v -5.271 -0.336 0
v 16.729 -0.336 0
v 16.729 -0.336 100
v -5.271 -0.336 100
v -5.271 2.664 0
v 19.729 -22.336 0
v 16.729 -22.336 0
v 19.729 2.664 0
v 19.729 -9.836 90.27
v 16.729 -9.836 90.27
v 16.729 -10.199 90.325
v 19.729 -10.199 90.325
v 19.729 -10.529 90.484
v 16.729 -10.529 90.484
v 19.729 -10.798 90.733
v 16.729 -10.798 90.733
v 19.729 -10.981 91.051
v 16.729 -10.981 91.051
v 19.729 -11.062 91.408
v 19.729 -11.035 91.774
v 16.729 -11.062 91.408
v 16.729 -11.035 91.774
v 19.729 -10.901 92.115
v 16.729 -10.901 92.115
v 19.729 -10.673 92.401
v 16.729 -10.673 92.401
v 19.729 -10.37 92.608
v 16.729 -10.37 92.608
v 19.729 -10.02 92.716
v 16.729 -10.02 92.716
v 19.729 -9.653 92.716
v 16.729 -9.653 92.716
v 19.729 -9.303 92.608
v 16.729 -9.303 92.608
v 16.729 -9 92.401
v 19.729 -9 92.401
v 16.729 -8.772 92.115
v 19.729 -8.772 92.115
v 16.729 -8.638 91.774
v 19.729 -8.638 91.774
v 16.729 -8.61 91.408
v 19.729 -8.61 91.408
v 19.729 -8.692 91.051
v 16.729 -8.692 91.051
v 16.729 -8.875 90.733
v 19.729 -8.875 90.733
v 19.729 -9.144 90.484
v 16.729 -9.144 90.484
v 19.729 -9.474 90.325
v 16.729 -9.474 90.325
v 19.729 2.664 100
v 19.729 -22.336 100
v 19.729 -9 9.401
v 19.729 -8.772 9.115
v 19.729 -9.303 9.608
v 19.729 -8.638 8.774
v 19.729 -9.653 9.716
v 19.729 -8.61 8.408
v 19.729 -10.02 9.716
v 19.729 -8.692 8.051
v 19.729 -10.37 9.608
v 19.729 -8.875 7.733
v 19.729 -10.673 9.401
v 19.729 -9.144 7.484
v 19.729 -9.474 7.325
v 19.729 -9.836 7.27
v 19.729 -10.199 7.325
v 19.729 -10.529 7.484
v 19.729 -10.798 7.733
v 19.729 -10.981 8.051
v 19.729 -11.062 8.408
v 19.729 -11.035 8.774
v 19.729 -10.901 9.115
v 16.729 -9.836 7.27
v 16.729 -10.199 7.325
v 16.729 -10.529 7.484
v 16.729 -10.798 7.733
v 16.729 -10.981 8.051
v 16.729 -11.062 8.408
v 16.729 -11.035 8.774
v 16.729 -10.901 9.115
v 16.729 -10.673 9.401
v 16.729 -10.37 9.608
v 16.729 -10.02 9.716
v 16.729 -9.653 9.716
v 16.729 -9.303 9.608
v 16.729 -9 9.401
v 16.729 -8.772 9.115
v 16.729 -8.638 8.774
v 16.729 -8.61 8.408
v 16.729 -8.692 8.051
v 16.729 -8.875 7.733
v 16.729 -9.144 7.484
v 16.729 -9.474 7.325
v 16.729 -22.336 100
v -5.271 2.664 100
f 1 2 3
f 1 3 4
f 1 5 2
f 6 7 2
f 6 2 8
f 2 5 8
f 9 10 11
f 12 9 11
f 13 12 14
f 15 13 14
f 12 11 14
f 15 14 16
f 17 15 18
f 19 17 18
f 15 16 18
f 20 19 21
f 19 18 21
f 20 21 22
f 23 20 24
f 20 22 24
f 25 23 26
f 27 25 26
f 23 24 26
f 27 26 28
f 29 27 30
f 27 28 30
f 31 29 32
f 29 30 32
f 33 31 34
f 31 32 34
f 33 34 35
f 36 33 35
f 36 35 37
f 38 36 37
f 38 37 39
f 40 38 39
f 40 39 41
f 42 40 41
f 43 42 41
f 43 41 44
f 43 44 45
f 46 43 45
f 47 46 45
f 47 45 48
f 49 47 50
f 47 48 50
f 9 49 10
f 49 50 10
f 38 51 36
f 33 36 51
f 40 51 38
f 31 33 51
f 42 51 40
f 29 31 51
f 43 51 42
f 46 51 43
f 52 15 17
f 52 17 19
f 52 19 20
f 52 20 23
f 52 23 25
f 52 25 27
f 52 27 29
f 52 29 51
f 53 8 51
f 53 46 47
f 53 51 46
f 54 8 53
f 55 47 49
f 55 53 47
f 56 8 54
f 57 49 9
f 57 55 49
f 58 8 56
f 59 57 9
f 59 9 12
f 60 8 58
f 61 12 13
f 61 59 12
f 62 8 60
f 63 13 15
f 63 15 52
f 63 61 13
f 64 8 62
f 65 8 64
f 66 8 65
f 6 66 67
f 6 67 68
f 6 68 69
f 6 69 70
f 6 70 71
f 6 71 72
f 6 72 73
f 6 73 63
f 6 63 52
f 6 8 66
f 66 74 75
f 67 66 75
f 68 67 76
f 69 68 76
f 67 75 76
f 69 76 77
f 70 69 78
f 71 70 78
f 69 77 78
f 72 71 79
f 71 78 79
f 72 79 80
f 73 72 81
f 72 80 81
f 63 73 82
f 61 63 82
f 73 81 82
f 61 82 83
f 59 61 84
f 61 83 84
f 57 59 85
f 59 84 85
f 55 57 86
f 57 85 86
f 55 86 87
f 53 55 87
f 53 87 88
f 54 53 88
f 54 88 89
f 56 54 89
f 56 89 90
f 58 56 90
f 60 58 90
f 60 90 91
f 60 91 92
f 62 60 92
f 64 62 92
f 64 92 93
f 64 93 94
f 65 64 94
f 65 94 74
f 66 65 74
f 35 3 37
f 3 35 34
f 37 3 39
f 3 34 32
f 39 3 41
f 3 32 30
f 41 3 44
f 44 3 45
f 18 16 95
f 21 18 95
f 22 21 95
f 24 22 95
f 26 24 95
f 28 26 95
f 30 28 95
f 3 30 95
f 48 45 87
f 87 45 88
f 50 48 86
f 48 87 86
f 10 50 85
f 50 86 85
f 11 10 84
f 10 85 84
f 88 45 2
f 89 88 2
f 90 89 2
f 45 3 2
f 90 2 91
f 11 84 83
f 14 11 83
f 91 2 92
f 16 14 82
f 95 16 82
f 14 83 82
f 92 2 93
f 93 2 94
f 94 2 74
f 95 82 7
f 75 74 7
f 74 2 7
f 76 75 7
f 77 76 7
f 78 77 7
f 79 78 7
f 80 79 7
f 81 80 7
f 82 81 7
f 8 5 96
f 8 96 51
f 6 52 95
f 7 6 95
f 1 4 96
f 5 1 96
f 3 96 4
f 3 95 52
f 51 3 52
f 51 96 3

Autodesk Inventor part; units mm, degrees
ref_plane "YZ Plane" through (0, 0, 0) normal (1, 0, 0) x (0, 1, 0)
ref_plane "XZ Plane" through (0, 0, 0) normal (0, 1, 0) x (-1, 0, 0)
ref_plane "XY Plane" through (0, 0, 0) normal (0, 0, 1) x (1, 0, 0)
sketch "Skizze1" plane through (0, 0, 0) normal (0, 0, 1) x (1, 0, 0)
  line L0 (-10.271, 0) -> (24.729, 0) projected
  line L1 (0, -27.3364) -> (0, 7.6636) projected
  line L2 (16.729, -0.3364) -> (-5.271, -0.3364)
  line L3 (-5.271, -0.3364) -> (-5.271, 2.6636)
  line L4 (-5.271, 2.6636) -> (19.729, 2.6636)
  line L5 (19.729, 2.6636) -> (19.729, -22.3364)
  line L6 (19.729, -22.3364) -> (16.729, -22.3364)
  line L7 (16.729, -0.3364) -> (16.729, -22.3364)
  point P0 (0, 0)
  dimension "d0" = 3
  dimension "d1" = 3
  dimension "d2" = 25
  dimension "d3" = 25
extrude "Extrusion1" add sketch "Skizze1" along normal blind 100
sketch "Skizze2" plane through (19.729, -22.3364, 0) normal (1, 0, 0) x (0, 0, -1)
  line L0 (0, 25) -> (-100, 25) projected
  line L1 (-100, 0) -> (-100, 25) projected
  line L2 (0, 0) -> (0, 25) projected
  point P0 (0, 22.3364)
  point P1 (-91.5, 12.5)
  point P2 (-8.5, 12.5)
  dimension "d6" = 12.5
  dimension "d7" = 12.5
  dimension "d8" = 8.5
  dimension "d9" = 8.5
hole "Bohrung1" at (19.729, -9.8364, 91.5) at (19.729, -9.8364, 8.5) direction (-1, 0, 0) diameter 2.459 depth 8.8 tip angle 118 thread size "M3x0.5" class "6H" standard "ISO Metric profile"
properties part number "Halter vorne"
